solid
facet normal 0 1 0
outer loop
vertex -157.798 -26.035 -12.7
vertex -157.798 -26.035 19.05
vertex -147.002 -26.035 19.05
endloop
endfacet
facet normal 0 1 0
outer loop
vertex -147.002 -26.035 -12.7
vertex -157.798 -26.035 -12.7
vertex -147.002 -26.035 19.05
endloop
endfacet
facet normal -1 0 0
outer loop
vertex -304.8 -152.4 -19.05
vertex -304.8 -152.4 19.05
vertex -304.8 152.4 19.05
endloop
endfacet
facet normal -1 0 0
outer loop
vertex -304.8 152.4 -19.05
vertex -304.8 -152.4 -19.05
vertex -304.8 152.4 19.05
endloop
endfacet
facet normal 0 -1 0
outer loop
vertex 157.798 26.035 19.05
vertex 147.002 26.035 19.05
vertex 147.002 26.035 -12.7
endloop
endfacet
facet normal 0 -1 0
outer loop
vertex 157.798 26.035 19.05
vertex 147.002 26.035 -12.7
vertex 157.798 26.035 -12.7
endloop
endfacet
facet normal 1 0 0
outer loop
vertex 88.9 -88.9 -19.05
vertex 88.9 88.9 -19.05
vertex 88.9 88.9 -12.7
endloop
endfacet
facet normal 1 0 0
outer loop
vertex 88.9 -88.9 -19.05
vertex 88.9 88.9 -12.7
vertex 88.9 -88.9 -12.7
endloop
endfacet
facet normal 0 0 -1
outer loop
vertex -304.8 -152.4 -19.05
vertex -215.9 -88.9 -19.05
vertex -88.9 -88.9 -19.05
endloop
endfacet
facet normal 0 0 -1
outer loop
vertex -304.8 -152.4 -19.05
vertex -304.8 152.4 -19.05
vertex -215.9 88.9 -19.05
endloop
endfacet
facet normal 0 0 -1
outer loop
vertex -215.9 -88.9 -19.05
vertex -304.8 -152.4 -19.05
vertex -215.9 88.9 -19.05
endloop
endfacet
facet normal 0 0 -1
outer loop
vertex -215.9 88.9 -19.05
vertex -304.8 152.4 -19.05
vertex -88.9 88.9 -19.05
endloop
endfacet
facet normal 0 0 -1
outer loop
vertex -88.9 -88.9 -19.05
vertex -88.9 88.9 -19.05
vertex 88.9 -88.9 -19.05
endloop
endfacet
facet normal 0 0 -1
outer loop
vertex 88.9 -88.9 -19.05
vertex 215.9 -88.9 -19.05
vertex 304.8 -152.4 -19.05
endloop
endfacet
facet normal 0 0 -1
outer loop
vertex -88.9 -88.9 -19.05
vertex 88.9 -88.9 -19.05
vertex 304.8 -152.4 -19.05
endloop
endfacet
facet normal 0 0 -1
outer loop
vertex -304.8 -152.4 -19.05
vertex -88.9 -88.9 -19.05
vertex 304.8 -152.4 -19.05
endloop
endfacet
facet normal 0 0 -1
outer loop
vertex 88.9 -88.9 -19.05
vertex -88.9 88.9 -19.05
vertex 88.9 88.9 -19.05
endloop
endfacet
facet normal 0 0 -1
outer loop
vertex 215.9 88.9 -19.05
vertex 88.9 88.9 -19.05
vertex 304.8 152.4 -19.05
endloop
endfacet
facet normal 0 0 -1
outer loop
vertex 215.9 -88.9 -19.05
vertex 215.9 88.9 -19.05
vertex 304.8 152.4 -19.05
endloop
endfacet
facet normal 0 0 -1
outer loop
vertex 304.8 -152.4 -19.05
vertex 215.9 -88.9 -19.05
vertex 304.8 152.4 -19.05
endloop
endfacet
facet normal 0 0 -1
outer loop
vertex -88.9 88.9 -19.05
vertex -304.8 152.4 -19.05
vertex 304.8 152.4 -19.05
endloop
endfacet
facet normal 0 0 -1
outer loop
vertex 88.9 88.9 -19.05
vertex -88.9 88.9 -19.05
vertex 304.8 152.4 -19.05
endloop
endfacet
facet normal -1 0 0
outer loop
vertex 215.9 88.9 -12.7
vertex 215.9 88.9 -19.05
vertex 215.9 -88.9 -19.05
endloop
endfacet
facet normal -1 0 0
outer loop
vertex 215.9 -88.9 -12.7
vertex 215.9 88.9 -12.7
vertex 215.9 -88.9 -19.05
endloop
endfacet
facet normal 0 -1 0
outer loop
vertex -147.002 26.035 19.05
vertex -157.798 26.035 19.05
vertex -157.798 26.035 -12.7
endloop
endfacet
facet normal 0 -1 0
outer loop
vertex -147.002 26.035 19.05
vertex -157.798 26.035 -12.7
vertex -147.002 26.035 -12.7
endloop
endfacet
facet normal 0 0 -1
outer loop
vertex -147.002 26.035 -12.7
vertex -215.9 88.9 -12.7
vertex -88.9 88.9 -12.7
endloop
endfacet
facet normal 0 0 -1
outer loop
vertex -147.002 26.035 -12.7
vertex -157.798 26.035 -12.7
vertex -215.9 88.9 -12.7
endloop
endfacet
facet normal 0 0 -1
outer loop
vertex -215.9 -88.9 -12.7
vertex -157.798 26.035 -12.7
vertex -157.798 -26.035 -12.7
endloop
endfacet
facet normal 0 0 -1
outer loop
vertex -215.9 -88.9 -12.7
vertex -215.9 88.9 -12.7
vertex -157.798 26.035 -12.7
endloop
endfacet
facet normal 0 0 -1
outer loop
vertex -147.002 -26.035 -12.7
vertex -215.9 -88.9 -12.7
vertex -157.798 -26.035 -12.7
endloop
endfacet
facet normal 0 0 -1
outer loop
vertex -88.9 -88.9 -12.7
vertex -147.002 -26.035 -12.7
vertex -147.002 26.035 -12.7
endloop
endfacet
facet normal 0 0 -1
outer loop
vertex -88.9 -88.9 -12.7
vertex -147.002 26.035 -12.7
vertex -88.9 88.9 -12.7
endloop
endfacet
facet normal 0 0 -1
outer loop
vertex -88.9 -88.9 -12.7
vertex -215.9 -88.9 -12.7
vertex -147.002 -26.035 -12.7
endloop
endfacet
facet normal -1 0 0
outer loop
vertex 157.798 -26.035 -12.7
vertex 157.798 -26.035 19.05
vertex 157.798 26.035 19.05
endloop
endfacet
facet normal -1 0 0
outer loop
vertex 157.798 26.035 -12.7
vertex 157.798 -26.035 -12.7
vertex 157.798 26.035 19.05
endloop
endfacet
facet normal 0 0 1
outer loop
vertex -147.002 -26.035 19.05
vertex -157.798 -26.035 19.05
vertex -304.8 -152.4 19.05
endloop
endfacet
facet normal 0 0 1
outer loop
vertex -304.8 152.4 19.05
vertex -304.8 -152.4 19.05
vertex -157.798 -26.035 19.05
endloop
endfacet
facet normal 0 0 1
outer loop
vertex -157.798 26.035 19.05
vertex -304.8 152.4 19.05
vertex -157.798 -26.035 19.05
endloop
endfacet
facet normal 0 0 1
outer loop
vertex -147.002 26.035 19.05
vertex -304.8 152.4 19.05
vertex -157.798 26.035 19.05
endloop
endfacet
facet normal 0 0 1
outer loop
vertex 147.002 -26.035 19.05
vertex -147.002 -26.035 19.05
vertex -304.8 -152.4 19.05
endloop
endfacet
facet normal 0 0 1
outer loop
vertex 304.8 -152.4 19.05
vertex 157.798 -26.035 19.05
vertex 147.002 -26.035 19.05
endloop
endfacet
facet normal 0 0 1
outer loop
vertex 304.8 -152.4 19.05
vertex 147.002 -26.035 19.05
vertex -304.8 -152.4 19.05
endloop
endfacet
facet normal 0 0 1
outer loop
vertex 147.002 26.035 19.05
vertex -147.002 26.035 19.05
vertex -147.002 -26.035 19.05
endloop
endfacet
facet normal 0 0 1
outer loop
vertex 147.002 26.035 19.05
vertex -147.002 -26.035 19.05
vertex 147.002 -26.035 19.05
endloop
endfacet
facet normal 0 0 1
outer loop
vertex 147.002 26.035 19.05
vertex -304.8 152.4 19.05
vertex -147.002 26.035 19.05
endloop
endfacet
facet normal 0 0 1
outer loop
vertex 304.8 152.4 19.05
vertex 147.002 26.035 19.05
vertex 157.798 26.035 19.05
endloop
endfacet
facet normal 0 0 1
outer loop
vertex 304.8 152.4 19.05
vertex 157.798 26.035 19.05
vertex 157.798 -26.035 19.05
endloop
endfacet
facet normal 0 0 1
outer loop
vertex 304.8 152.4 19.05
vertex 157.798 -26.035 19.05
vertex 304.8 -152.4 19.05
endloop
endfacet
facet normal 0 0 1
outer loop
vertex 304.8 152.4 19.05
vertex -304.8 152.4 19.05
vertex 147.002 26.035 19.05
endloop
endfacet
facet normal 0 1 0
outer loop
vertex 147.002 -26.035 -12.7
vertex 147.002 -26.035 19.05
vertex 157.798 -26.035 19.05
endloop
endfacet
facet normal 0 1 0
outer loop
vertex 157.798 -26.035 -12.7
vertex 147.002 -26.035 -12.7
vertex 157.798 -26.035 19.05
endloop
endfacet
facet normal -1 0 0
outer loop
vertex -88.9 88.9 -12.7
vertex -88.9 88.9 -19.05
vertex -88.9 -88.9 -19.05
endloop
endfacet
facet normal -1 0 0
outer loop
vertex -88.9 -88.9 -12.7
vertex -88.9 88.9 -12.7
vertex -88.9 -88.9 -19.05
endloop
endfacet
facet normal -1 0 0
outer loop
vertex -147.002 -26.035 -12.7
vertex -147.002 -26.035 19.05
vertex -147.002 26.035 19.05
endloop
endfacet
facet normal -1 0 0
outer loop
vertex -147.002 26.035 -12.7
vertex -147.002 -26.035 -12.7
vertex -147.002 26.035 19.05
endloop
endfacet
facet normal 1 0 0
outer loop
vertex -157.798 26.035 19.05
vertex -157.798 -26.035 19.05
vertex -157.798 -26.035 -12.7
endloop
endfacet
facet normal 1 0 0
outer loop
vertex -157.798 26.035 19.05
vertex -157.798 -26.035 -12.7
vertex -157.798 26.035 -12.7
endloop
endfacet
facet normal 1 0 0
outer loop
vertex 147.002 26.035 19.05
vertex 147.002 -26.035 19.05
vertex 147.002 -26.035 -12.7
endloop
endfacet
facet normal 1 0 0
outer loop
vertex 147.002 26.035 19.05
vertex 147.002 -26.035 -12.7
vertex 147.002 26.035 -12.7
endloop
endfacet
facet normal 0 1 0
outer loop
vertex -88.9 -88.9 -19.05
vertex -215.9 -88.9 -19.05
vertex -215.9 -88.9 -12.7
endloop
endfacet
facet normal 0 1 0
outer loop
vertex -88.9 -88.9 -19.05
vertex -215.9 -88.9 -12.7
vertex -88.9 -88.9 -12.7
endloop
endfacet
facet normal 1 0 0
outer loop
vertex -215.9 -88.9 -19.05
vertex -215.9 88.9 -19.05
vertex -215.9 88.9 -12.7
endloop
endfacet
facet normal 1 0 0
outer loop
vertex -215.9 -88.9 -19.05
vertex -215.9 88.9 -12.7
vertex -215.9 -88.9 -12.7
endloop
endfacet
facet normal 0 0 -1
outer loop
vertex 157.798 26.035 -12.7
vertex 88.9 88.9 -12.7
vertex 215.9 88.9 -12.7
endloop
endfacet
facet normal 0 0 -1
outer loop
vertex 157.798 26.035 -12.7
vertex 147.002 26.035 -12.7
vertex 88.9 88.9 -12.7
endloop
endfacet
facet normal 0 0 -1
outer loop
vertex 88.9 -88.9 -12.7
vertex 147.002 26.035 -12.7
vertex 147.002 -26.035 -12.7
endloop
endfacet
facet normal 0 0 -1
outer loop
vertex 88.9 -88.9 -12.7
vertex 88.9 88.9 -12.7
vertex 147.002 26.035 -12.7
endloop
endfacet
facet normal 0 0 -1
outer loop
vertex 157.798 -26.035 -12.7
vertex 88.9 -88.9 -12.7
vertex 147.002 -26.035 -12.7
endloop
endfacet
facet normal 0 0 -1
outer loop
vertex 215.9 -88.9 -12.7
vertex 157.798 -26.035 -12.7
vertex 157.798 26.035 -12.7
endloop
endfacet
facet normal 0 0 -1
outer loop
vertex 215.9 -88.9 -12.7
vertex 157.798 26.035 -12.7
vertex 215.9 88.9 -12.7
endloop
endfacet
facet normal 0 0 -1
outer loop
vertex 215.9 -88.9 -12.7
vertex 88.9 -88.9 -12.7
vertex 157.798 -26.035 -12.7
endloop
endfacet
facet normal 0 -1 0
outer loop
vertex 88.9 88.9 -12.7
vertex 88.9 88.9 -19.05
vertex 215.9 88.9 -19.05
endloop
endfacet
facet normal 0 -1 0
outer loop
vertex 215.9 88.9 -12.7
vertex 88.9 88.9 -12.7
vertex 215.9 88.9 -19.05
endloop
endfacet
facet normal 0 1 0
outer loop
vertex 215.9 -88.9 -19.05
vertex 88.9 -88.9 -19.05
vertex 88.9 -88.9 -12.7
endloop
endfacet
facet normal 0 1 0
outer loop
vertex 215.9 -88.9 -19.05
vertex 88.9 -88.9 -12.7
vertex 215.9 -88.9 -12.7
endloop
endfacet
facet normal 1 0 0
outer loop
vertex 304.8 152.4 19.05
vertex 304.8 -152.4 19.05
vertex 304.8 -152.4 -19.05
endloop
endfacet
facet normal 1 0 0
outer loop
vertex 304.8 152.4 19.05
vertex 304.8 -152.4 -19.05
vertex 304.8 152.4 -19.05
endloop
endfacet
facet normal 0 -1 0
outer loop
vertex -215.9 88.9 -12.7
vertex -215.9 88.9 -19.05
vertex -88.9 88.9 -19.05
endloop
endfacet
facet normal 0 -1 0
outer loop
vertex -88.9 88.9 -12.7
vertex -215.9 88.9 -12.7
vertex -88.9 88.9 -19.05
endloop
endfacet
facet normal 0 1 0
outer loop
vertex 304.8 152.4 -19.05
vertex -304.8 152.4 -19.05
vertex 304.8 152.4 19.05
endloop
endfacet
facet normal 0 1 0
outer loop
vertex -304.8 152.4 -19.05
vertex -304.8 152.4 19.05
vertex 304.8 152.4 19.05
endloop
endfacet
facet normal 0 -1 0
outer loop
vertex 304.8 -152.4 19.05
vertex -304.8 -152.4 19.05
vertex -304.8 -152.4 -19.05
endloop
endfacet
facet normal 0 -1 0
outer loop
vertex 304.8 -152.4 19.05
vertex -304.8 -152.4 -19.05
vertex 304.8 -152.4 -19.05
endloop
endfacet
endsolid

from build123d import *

# Parameters (mm, degrees)
F0_W     = 609.6
F0_H     = 304.8
F1_DEPTH = 19.05
F2_W     = 10.795
F2_H     = 52.07
F3_DEPTH = 38.101
F4_W     = 127
F4_H     = 177.8
F5_DEPTH = 6.35


with BuildPart() as f1:
    # F0 (on Top) → F1 (new body, symmetric)
    with BuildSketch(Plane.XY):
        Rectangle(F0_W, F0_H)
    extrude(amount=F1_DEPTH, both=True)

    # F2 (on face) → F3 (cut, through all)
    with BuildSketch(Plane.XY.offset(19.05)):
        with Locations((-152.4, 0)):
            Rectangle(F2_W, F2_H)
        with Locations((152.4, 0)):
            Rectangle(F2_W, F2_H)
    extrude(amount=-F3_DEPTH, mode=Mode.SUBTRACT)

    # F4 (on face) → F5 (cut)
    with BuildSketch(Plane(origin=(0, 0, -19.05), x_dir=(1, 0, 0), z_dir=(0, 0, -1))):
        with Locations((-152.4, 0)):
            Rectangle(F4_W, F4_H)
        with Locations((152.4, 0)):
            Rectangle(F4_W, F4_H)
    extrude(amount=-F5_DEPTH, mode=Mode.SUBTRACT)


solid = f1.part
